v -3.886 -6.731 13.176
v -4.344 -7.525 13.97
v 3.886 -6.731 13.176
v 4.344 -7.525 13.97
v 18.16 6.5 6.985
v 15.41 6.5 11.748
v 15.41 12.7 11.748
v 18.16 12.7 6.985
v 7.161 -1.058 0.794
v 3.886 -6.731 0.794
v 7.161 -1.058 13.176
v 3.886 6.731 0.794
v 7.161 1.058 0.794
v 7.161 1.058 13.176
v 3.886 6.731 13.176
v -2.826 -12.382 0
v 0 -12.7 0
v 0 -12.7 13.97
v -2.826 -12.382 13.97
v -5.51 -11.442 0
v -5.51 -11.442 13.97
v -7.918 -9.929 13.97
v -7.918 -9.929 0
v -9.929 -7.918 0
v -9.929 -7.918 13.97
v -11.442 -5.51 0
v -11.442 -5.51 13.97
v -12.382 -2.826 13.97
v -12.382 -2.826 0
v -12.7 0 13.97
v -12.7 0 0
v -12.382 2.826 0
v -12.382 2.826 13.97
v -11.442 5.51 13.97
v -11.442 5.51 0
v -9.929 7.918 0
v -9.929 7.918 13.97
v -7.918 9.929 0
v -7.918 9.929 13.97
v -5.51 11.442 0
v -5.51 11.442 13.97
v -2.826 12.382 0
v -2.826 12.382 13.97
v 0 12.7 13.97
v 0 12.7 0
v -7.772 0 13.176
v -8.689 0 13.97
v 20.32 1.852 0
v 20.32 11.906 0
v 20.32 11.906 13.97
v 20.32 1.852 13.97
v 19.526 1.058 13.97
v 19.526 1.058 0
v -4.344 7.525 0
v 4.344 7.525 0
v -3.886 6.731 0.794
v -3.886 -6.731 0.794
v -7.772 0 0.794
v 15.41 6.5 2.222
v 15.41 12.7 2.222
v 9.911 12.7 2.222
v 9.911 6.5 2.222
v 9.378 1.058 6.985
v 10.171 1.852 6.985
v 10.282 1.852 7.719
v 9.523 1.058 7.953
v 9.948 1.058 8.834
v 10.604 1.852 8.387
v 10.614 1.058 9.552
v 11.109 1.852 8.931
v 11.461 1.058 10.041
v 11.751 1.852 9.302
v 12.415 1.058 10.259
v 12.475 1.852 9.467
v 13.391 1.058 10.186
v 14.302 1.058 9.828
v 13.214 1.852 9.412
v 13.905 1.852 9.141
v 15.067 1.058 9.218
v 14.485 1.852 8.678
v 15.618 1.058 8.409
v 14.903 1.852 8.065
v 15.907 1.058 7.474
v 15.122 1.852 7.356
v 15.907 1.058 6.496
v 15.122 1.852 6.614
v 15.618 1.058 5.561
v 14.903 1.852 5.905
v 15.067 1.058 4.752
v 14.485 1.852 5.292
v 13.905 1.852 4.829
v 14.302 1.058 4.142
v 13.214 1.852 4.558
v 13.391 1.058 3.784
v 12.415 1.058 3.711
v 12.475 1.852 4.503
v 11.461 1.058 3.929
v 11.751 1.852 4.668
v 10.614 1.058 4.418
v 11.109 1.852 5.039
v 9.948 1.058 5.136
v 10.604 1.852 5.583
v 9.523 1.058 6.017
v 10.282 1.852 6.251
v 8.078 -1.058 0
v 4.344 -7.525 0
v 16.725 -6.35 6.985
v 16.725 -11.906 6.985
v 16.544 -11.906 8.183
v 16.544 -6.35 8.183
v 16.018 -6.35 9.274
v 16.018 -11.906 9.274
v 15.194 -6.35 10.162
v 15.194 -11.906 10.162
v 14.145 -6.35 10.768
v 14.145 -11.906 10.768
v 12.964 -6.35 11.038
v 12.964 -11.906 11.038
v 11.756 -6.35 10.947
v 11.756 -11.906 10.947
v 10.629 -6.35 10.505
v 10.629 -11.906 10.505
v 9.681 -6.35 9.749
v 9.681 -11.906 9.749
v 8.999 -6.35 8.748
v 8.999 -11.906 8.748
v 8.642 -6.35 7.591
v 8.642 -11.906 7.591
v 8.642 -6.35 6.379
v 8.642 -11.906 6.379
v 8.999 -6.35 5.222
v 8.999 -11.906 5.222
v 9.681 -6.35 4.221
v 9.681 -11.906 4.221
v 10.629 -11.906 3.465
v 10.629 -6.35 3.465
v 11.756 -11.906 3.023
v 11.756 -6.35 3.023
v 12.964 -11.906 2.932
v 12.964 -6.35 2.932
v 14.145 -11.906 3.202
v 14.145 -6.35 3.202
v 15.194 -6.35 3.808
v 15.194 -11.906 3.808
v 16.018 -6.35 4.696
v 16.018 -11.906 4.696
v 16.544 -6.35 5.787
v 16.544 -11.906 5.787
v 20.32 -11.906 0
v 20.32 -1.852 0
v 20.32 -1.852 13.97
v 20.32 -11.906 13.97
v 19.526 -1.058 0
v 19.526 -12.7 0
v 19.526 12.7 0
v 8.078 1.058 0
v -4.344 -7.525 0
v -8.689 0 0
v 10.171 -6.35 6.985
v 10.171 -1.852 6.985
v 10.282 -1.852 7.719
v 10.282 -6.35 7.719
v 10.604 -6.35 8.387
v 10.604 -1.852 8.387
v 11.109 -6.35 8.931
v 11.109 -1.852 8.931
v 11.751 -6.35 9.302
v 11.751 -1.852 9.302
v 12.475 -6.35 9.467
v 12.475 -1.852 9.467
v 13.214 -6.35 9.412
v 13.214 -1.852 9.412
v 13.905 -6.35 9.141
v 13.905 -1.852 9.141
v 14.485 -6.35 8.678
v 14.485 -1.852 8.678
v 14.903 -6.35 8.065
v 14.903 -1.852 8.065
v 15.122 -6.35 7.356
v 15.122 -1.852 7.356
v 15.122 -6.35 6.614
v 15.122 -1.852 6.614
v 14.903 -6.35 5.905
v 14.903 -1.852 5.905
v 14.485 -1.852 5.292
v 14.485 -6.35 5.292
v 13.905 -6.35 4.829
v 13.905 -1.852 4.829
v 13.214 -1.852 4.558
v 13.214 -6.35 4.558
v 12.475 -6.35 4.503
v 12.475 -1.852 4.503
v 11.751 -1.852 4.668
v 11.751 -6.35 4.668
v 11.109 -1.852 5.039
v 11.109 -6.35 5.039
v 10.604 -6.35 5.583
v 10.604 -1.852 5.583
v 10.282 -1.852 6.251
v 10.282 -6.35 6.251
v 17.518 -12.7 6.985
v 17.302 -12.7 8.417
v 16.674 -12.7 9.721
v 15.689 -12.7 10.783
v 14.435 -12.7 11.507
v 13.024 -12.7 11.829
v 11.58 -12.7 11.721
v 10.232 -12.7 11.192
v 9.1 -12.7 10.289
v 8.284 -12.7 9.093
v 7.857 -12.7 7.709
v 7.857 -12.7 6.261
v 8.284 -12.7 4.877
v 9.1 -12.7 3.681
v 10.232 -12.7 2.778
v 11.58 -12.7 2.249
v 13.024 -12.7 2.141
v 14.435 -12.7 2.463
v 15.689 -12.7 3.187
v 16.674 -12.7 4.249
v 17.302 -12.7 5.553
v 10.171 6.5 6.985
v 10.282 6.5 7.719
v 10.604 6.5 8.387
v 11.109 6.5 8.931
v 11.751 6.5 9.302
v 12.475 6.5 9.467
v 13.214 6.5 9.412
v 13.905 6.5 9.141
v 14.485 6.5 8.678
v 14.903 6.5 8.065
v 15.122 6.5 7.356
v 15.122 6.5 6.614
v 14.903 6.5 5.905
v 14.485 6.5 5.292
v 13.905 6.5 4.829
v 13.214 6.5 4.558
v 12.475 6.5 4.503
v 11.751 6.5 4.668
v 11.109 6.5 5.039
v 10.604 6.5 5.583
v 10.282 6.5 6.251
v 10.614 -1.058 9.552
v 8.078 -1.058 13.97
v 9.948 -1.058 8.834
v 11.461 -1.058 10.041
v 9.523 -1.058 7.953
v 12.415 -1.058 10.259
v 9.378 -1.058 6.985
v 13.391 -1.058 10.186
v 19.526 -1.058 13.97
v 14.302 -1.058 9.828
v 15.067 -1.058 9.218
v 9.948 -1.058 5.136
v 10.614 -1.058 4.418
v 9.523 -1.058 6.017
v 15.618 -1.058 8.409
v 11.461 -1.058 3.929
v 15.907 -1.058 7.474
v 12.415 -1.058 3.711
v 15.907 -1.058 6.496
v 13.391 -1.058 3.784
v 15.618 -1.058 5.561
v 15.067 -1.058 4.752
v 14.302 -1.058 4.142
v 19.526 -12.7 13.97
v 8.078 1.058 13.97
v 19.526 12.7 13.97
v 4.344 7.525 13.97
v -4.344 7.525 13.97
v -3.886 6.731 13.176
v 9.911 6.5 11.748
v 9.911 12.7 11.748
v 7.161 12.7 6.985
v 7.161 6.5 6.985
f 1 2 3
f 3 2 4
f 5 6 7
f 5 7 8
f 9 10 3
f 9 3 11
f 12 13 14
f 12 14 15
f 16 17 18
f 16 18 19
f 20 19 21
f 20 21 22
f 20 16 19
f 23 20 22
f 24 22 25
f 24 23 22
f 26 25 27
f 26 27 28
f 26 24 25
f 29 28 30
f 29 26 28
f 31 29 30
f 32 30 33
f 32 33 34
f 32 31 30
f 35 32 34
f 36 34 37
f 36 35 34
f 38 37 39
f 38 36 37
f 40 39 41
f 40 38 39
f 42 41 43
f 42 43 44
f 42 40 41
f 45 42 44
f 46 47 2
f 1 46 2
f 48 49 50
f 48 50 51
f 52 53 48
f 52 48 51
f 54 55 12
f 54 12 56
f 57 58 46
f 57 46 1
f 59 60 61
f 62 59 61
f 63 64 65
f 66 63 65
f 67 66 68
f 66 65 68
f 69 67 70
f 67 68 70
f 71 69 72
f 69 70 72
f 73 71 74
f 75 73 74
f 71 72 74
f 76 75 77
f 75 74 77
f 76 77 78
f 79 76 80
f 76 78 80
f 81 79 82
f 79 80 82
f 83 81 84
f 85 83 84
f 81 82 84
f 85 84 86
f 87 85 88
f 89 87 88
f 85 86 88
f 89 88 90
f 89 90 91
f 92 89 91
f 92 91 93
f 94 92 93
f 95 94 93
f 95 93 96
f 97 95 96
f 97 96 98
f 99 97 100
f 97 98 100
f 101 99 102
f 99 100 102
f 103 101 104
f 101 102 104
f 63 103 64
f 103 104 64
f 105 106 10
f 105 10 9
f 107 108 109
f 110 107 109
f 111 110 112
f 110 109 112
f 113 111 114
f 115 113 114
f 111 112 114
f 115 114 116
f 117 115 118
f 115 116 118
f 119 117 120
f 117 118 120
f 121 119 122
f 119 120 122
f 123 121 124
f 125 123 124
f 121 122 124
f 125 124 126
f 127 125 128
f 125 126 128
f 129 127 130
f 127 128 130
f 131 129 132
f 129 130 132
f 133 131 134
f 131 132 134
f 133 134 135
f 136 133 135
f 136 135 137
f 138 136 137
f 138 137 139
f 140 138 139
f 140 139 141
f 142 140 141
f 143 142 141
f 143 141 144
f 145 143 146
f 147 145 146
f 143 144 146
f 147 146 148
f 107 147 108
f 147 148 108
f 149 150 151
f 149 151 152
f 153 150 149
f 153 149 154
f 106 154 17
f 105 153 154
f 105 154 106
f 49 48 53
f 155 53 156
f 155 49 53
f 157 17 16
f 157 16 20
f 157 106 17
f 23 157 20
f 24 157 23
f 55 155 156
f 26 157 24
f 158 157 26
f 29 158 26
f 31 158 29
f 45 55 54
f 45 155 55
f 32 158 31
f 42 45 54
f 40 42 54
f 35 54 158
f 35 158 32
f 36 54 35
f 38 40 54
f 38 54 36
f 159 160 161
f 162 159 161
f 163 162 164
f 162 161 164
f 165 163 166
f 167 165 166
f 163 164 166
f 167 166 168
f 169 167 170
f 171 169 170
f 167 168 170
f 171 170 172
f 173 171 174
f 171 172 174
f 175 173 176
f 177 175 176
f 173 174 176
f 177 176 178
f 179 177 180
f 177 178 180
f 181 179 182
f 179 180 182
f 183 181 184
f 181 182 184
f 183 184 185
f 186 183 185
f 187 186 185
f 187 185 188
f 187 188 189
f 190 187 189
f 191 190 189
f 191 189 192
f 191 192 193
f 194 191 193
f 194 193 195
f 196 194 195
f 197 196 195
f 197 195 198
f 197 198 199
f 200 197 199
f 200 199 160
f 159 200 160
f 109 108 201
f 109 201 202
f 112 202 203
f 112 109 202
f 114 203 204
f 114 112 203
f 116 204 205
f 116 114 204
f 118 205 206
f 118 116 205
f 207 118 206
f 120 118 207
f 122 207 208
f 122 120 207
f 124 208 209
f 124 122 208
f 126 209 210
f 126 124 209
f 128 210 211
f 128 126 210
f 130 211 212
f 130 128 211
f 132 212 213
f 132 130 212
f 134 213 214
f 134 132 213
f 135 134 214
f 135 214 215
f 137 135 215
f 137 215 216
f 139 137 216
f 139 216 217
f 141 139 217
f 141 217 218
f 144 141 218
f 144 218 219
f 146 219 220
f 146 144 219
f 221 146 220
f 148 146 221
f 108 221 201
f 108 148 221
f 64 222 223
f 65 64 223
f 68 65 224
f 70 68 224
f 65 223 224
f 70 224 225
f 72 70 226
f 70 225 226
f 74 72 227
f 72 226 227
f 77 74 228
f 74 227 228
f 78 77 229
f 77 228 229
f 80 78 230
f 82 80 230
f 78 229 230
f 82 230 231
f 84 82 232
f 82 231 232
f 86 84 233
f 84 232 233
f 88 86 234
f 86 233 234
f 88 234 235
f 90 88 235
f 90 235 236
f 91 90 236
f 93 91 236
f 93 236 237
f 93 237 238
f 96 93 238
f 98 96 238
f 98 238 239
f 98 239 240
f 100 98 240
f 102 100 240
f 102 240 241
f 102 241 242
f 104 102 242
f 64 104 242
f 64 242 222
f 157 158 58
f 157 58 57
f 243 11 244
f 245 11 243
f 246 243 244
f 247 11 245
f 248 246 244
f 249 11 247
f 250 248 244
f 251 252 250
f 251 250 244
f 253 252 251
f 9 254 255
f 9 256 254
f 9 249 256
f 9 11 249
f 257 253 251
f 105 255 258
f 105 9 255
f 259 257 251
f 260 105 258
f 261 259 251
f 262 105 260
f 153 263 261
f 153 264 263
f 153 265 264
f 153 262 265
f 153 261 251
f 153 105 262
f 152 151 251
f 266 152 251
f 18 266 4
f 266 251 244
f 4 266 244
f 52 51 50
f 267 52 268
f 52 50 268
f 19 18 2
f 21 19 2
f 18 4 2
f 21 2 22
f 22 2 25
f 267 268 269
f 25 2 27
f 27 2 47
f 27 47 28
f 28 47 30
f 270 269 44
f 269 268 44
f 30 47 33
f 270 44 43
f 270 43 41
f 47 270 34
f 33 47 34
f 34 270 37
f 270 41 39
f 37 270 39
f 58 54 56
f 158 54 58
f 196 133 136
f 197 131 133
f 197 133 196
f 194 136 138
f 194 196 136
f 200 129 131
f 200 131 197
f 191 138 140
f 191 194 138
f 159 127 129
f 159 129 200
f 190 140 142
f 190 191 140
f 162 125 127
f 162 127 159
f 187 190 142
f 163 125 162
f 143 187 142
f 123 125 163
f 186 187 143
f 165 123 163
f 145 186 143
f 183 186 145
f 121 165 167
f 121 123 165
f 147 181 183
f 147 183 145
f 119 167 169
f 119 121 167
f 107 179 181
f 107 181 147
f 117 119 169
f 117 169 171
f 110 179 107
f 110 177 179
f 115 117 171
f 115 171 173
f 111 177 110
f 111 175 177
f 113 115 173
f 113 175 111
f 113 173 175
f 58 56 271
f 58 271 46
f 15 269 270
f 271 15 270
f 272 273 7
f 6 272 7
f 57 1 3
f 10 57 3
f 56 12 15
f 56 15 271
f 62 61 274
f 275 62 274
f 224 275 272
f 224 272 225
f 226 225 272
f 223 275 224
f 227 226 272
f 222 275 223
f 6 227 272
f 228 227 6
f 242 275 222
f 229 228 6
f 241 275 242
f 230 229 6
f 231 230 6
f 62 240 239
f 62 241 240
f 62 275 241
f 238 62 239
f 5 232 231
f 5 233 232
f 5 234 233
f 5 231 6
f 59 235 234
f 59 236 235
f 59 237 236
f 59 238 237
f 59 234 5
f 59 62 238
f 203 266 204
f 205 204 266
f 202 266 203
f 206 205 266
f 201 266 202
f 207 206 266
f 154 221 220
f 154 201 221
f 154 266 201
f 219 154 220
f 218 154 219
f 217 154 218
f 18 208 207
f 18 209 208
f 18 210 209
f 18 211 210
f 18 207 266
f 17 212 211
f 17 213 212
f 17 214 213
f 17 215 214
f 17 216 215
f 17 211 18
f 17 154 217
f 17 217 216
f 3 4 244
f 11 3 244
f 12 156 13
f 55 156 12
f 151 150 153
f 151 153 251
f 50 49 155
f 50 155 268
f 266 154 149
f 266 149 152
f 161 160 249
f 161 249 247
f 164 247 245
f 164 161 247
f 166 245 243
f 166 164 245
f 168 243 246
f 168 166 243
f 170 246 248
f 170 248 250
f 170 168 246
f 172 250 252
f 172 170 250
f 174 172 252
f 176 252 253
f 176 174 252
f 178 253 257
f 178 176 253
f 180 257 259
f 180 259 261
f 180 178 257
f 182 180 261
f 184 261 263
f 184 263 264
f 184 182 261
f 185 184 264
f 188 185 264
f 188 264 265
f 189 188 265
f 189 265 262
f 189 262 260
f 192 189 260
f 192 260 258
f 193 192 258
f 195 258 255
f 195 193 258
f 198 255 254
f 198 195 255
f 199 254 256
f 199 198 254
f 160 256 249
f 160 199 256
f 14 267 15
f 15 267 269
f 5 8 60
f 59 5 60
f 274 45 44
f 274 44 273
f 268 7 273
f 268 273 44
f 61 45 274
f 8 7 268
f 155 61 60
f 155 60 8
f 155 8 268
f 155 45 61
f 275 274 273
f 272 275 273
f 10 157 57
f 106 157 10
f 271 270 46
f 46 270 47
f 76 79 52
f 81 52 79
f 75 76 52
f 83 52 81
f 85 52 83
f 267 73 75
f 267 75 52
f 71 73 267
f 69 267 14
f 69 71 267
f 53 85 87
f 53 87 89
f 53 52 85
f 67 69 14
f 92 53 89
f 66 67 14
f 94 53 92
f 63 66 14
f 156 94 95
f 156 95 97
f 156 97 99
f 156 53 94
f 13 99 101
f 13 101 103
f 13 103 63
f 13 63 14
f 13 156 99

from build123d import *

# Parameters (mm, degrees)
BOSS_EXTRUDE1_DEPTH = 13.97
CHAMFER1_SIZE       = 0.79375
SKETCH3_R           = 2.4892
CUT_EXTRUDE1_DEPTH  = 36.400894057
CUT_EXTRUDE2_DEPTH  = 6.2
SKETCH5_R           = 4.064
CUT_EXTRUDE3_DEPTH  = 6.35
CHAFL_N1_SIZE       = 0.79375


with BuildPart() as part:
    # Sketch2 → Boss-Extrude1 (new body)
    with BuildSketch(Plane.XY):
        with BuildLine():
            Line((3.886144662, -6.731), (7.161260289, -1.058333333))
            Line((7.161260289, -1.058333333), (10.16, -1.058333333))
            Line((10.16, -1.058333333), (20.32, -1.058333333))
            Line((20.32, -1.058333333), (20.32, -12.7))
            Line((20.32, -12.7), (0, -12.7))
            ThreePointArc((0, -12.7), (-12.7, 0), (0, 12.7))
            Line((0, 12.7), (20.32, 12.7))
            Line((20.32, 12.7), (20.32, 1.058333333))
            Line((20.32, 1.058333333), (10.16, 1.058333333))
            Line((10.16, 1.058333333), (7.161260289, 1.058333333))
            Line((7.161260289, 1.058333333), (3.886144662, 6.731))
            Line((3.886144662, 6.731), (-3.886144662, 6.731))
            Line((-3.886144662, 6.731), (-7.772289324, 0))
            Line((-7.772289324, 0), (-3.886144662, -6.731))
            Line((-3.886144662, -6.731), (3.886144662, -6.731))
        make_face()
    extrude(amount=BOSS_EXTRUDE1_DEPTH)

    # Chamfer1
    chamfer1_edges = [part.edges().sort_by_distance(p)[0] for p in [
        (5.523702475, 3.894666667, 0),
        (0, 6.731, 0),
        (-5.829216993, 3.3655, 0),
        (-5.829216993, -3.3655, 0),
        (0, -6.731, 0),
        (5.523702475, -3.894666667, 0),
        (20.32, -1.058333333, 6.985),
        (20.32, -12.7, 6.985),
        (20.32, 12.7, 6.985),
        (20.32, 1.058333333, 6.985),
        (5.523702475, -3.894666667, 13.97),
        (0, -6.731, 13.97),
        (-5.829216993, -3.3655, 13.97),
        (-5.829216993, 3.3655, 13.97),
        (0, 6.731, 13.97),
        (5.523702475, 3.894666667, 13.97),
    ]]
    chamfer(chamfer1_edges, length=CHAMFER1_SIZE)

    # Sketch3 → Cut-Extrude1 (cut, through all)
    with BuildSketch(Plane(origin=(0, 12.7, 0), x_dir=(1, 0, 0), z_dir=(0, 1, 0))):
        with Locations(Location((12.660521603, -6.985, 0), (0, 0, 180))):
            Circle(SKETCH3_R)
    extrude(amount=-CUT_EXTRUDE1_DEPTH, mode=Mode.SUBTRACT)

    # Sketch4 → Cut-Extrude2 (cut)
    with BuildSketch(Plane(origin=(0, 12.7, 0), x_dir=(1, 0, 0), z_dir=(0, 1, 0))):
        Polygon((9.910890946, -11.7475), (15.41015226, -11.7475), (18.159782917, -6.985), (15.41015226, -2.2225), (9.910890946, -2.2225), (7.161260289, -6.985), align=None)
    extrude(amount=-CUT_EXTRUDE2_DEPTH, mode=Mode.SUBTRACT)

    # Sketch5 → Cut-Extrude3 (cut)
    with BuildSketch(Plane.XZ.offset(12.7)):
        with Locations((12.660521603, 6.985)):
            Circle(SKETCH5_R)
    extrude(amount=-CUT_EXTRUDE3_DEPTH, mode=Mode.SUBTRACT)

    # Chaflán1
    chafl_n1_edges = [part.edges().sort_by_distance(p)[0] for p in [
        (15.149721603, -1.058333333, 6.985),
        (15.149721603, 1.058333333, 6.985),
        (8.596521603, -12.7, 6.985),
    ]]
    chamfer(chafl_n1_edges, length=CHAFL_N1_SIZE)


solid = part.part
